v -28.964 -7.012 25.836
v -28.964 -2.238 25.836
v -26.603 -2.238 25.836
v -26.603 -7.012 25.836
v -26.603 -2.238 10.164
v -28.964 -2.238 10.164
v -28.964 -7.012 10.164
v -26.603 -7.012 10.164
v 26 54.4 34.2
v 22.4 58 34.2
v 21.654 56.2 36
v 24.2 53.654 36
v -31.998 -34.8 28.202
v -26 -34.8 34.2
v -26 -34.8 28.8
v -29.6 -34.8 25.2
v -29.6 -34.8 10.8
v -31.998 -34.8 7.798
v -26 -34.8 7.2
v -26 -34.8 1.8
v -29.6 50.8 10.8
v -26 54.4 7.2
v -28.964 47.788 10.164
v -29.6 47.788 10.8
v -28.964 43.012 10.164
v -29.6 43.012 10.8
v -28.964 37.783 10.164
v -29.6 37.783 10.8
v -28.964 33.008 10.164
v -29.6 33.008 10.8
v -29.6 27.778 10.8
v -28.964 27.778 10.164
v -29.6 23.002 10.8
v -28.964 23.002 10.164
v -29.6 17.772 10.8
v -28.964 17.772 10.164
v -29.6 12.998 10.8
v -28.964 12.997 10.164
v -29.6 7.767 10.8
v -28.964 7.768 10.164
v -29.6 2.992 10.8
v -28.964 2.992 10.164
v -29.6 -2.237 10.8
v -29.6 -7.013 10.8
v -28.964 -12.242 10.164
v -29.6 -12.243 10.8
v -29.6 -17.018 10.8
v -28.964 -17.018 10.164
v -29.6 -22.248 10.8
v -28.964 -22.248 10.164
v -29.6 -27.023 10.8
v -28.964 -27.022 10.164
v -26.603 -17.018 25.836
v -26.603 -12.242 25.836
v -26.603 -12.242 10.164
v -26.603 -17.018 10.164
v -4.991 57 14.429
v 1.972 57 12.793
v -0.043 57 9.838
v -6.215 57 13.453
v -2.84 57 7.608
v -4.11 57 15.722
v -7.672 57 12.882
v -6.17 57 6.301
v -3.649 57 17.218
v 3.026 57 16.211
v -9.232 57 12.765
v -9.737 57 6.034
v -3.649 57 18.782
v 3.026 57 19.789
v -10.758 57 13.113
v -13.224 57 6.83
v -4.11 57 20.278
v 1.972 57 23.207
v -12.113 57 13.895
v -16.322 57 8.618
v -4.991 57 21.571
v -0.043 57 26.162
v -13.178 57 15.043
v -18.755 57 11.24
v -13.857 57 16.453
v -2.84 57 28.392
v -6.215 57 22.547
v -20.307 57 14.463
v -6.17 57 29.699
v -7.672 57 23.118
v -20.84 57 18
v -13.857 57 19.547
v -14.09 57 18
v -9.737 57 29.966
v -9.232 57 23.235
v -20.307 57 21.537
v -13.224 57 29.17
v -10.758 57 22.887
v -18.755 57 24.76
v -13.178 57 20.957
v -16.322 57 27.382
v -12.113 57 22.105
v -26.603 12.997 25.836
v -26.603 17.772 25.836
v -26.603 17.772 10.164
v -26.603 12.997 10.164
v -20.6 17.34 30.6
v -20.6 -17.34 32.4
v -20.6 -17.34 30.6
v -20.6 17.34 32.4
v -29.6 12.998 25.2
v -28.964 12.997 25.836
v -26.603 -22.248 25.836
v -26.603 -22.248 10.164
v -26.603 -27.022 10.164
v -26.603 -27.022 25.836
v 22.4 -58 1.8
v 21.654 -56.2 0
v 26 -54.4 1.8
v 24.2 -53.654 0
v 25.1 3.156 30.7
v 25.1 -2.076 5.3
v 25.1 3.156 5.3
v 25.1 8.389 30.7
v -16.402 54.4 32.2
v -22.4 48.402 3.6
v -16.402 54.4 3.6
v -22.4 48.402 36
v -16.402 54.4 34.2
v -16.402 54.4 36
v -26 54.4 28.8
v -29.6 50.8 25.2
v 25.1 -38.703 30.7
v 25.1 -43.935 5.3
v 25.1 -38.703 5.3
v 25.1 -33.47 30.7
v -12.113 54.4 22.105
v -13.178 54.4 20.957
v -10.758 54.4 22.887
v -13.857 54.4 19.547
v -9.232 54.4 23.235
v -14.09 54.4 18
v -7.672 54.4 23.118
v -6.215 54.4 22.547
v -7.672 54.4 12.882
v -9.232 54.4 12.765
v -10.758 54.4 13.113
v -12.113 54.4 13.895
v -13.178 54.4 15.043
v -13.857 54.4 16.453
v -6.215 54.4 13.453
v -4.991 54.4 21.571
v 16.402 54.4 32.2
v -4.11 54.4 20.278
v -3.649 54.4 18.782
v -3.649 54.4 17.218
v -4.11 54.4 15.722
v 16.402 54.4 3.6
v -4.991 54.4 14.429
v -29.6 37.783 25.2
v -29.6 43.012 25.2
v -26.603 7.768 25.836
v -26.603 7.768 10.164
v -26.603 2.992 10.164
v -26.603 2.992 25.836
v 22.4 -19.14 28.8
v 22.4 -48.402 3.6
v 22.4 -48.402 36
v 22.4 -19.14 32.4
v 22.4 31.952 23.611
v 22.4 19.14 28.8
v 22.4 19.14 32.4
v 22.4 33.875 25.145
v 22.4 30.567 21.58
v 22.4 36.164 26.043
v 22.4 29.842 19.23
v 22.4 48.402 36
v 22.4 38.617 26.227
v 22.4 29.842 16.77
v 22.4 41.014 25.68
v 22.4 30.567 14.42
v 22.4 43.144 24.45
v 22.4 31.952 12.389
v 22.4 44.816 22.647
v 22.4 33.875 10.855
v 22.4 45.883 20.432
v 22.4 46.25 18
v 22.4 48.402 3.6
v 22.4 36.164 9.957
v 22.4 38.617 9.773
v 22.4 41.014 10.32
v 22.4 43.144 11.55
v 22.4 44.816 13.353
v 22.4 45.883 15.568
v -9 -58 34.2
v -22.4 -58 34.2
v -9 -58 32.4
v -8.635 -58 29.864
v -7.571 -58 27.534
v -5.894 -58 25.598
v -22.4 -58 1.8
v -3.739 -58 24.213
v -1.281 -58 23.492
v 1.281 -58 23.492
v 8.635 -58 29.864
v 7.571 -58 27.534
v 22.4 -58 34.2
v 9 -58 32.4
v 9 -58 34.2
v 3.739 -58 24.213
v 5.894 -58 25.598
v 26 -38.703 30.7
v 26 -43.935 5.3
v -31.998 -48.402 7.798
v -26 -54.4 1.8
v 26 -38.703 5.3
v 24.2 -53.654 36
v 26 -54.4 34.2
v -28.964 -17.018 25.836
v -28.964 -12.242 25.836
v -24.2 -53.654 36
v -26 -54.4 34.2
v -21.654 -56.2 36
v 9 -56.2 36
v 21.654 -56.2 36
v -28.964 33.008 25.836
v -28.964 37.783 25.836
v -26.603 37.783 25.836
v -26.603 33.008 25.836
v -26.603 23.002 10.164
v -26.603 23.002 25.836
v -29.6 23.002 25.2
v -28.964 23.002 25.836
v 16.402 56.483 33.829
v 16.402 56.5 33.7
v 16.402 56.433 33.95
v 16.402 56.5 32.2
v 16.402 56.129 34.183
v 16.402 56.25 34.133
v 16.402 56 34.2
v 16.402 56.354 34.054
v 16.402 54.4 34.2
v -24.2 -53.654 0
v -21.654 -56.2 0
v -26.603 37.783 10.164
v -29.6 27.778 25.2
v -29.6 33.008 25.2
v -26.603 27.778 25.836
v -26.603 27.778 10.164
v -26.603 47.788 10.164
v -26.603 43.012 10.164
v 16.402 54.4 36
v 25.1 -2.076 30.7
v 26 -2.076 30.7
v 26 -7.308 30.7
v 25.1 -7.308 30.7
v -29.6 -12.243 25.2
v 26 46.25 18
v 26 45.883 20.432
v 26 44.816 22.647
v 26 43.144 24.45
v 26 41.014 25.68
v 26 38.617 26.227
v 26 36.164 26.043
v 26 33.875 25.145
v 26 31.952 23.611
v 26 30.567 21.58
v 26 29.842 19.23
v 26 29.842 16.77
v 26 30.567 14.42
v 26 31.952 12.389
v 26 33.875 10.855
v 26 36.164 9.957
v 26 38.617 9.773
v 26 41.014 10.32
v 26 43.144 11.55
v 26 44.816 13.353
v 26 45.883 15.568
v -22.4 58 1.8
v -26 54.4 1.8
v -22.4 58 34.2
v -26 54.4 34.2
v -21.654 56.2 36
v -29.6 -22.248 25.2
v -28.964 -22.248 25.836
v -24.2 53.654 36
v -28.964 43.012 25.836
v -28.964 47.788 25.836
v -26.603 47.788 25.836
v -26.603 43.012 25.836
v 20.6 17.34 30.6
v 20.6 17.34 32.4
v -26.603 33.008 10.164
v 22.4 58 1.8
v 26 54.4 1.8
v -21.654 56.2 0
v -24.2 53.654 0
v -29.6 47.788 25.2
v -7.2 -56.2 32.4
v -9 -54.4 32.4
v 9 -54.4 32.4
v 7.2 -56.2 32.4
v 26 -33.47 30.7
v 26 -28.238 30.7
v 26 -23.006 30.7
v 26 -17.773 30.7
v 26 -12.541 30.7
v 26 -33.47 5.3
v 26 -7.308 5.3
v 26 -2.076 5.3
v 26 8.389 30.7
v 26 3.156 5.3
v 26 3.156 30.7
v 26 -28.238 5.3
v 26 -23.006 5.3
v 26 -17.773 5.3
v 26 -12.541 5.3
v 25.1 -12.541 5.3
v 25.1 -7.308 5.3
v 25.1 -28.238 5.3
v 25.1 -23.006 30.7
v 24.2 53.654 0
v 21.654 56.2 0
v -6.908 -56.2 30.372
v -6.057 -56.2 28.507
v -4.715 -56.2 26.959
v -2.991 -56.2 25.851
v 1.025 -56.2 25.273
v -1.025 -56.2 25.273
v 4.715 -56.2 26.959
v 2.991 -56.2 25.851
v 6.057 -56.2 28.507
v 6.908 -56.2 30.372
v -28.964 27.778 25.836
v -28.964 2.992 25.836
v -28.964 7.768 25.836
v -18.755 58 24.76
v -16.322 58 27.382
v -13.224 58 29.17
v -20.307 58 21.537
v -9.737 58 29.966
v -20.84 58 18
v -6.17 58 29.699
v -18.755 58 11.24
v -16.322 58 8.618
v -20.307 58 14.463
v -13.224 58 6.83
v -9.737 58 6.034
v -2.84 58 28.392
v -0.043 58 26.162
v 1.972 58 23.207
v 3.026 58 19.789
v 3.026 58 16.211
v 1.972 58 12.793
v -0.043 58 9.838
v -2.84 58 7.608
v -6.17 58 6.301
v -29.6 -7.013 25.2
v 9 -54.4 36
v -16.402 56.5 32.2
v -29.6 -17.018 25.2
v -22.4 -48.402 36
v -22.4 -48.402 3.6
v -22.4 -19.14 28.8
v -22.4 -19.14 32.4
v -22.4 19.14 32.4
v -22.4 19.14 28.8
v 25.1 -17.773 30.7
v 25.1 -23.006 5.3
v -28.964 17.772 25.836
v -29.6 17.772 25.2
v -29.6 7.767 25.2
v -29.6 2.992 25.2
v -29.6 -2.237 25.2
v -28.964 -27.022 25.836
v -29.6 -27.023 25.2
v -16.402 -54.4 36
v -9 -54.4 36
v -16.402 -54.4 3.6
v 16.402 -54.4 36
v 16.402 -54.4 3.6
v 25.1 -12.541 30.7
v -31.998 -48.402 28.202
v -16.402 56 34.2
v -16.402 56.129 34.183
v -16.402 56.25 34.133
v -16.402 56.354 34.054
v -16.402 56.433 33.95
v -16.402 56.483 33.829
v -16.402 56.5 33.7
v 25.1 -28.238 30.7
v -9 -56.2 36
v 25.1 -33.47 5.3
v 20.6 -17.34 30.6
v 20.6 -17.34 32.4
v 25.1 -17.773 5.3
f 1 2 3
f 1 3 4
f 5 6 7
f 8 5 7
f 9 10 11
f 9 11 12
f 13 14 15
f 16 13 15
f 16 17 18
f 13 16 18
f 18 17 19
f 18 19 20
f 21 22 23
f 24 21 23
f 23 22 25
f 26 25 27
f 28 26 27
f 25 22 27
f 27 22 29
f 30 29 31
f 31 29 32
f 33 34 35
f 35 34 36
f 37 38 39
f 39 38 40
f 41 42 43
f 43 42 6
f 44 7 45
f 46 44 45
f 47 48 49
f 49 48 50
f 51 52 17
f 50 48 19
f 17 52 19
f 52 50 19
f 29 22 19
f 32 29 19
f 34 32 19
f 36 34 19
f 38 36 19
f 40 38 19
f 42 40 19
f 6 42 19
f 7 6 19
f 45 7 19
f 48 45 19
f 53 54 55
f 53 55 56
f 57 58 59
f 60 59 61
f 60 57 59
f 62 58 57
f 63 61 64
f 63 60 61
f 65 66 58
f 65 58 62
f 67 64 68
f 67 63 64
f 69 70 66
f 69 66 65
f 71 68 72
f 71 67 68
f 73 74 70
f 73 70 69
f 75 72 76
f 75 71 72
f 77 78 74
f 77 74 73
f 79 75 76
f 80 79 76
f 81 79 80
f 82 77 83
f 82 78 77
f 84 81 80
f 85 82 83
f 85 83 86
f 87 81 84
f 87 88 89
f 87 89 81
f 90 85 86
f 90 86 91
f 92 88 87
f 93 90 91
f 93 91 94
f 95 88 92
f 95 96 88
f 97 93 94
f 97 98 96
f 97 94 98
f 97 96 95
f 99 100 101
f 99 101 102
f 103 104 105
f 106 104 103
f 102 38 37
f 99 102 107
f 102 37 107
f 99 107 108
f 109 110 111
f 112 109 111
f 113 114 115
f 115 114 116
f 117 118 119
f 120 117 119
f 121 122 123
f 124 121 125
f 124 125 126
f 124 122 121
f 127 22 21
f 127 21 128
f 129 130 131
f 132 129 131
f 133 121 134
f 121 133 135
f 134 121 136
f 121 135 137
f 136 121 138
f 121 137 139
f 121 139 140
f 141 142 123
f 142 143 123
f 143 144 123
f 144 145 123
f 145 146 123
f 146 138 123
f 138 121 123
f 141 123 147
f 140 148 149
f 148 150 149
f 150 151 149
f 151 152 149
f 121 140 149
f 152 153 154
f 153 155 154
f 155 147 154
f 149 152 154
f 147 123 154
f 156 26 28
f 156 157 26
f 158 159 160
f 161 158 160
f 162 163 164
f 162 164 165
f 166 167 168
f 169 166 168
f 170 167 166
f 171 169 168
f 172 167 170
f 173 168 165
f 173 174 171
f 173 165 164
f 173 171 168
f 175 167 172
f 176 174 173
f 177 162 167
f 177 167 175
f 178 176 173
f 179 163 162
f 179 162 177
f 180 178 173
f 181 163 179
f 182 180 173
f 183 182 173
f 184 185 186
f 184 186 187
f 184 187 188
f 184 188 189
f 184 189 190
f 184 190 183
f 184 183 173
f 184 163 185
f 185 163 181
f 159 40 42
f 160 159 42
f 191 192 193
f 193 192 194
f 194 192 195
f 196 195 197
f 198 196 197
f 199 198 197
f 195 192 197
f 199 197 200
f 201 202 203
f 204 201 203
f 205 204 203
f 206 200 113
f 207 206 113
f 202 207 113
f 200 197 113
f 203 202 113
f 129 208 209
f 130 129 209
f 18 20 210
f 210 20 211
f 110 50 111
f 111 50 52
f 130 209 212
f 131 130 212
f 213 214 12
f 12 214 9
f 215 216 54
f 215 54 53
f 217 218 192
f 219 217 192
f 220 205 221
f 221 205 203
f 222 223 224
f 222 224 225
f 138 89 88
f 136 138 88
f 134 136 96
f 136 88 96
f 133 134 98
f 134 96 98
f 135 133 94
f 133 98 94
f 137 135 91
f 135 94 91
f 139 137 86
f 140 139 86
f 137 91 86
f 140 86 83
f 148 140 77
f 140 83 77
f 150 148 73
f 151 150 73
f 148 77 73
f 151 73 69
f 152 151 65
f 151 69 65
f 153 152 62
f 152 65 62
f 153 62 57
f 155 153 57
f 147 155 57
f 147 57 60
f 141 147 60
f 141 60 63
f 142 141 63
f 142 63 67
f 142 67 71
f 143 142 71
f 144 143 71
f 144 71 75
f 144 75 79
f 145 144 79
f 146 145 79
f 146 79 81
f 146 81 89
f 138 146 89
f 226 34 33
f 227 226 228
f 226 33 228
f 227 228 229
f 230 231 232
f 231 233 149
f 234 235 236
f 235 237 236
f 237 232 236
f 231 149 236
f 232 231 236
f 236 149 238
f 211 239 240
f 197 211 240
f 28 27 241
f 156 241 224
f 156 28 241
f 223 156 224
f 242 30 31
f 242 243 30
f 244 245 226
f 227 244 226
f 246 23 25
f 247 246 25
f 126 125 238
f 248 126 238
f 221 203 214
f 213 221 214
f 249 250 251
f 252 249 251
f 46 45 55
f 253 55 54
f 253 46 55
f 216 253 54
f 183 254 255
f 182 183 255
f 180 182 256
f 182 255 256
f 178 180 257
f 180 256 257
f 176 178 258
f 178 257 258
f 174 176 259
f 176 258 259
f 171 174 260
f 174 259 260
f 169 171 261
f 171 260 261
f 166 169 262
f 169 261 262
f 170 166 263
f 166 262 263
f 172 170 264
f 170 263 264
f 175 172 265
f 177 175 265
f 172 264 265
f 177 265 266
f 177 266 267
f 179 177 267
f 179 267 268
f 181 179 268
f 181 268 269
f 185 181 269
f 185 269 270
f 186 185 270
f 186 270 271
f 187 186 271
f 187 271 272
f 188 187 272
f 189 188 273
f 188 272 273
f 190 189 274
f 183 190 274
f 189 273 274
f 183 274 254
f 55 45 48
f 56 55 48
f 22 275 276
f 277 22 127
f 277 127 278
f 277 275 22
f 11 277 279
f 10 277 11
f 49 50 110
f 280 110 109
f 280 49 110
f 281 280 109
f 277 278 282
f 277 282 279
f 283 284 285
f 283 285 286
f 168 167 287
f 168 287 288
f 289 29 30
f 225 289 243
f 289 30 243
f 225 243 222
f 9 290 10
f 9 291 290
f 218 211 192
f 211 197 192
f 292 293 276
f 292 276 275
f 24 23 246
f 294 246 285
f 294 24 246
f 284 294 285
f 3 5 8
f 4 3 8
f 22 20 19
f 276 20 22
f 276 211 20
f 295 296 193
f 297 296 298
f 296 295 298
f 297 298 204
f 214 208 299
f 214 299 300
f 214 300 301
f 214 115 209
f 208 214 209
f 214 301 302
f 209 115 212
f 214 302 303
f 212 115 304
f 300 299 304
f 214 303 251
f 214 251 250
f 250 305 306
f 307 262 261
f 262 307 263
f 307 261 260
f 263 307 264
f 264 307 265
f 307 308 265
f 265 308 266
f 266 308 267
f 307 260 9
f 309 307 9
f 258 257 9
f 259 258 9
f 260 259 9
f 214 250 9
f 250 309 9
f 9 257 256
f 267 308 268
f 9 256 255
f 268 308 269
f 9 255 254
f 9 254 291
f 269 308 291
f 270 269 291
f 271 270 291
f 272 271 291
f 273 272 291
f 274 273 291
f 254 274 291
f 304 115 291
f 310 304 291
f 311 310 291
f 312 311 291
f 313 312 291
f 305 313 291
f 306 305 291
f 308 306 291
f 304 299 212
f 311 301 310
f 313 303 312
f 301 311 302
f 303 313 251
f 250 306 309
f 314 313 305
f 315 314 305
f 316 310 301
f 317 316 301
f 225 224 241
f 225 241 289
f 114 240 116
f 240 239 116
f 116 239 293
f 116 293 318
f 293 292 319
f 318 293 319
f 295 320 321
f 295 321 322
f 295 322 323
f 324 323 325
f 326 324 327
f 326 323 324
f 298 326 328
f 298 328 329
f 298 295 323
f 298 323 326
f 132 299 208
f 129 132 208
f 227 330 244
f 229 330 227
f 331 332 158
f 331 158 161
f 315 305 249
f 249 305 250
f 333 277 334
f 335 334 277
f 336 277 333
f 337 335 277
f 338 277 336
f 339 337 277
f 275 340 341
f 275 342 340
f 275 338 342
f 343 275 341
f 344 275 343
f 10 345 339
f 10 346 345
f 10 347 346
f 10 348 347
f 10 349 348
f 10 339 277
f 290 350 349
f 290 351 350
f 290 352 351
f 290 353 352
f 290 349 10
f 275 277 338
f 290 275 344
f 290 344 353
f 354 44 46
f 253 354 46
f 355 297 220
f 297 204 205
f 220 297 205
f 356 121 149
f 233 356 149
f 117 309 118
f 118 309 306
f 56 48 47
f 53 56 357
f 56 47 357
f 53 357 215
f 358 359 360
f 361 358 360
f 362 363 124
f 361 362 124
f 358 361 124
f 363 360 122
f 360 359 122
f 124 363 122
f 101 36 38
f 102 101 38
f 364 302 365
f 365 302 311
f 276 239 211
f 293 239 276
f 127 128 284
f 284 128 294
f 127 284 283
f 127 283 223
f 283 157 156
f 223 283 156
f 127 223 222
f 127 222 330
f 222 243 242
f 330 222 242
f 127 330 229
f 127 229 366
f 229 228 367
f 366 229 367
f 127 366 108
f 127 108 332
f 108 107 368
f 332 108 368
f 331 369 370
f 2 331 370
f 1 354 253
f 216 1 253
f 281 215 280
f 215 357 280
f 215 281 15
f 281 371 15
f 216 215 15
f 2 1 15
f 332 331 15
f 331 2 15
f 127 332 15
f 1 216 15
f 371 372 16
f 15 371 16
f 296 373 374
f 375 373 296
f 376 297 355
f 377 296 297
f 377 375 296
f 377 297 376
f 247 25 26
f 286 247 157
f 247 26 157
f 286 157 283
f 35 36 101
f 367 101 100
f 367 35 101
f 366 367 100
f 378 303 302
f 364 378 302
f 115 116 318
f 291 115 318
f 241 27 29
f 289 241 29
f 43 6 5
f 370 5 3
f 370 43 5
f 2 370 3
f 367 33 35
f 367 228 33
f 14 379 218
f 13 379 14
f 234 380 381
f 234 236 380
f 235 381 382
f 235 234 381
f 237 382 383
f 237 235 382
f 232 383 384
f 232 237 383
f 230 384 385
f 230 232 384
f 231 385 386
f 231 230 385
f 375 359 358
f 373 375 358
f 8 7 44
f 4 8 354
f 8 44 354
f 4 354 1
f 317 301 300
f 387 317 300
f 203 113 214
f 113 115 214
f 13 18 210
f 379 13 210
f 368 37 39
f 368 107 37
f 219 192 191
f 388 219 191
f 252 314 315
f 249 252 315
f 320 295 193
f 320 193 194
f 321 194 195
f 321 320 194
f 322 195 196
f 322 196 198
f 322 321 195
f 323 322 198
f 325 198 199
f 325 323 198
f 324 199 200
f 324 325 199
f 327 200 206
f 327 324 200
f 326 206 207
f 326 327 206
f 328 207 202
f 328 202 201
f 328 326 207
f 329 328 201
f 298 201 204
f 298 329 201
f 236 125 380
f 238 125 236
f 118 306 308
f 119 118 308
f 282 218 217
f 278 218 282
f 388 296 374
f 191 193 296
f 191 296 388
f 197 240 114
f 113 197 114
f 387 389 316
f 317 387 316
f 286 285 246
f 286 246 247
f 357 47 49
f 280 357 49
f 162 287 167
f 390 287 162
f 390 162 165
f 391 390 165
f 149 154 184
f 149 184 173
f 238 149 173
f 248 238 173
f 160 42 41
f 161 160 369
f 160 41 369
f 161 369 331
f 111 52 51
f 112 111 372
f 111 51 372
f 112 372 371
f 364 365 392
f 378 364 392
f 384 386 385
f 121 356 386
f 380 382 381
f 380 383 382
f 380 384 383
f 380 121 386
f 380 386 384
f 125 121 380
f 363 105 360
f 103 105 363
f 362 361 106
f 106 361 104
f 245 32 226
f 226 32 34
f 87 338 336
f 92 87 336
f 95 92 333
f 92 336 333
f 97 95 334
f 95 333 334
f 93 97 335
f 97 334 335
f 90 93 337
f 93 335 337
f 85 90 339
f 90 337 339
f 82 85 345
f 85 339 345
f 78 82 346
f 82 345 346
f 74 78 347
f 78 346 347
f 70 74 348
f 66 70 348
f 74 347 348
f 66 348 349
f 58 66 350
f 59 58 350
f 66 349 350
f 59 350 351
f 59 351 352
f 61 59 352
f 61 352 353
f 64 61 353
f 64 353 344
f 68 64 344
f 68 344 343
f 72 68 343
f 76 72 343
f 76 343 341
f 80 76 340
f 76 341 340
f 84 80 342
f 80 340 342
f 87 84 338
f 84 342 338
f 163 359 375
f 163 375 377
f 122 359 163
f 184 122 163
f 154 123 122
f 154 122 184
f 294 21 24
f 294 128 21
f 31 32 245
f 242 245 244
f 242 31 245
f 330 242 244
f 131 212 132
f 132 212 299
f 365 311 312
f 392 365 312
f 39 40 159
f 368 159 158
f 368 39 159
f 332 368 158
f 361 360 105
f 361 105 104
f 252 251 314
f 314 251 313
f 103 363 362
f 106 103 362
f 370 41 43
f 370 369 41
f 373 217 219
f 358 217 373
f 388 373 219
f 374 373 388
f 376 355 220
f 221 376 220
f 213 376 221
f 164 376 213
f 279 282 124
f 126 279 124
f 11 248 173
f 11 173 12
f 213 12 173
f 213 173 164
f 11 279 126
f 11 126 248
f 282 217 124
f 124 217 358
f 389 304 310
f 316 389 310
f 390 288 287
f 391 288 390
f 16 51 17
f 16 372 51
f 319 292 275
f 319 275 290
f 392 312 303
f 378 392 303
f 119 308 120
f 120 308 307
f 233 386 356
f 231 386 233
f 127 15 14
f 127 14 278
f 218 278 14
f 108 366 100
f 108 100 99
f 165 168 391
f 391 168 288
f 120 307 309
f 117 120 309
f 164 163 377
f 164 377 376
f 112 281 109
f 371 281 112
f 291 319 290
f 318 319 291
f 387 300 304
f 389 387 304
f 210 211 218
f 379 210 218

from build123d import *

# Parameters (mm, degrees)
F2_W      = 52
F2_H      = 116
F2_W_2    = 44.8
F2_H_2    = 108.8
F3_DEPTH  = 36
F4_DEPTH  = 3.6
F7_SIZE   = 3.6
F8_SIZE   = 5.9976
F6_R      = 5.25
F9_DEPTH  = 3.6
F5_R      = 8.25
F10_DEPTH = 3.6
F11_W     = 18
F11_H     = 3.6
F12_DEPTH = 3.6
F13_W     = 32.8048
F13_H     = 2
F14_DEPTH = 2.1
F6_R_2    = 12
F15_DEPTH = 1
F16_R     = 0.5
F17_W     = 38.28
F17_H     = 3.6
F19_DEPTH = 1.8
F18_W     = 38.28
F18_H     = 3.6
F20_DEPTH = 1.8
F21_SIZE  = 1.79999
F23_DEPTH = 1.8
F24_SIZE  = 1.79999
F26_W     = 89.2
F26_H     = 21.6
F27_DEPTH = 3.6
F28_DEPTH = 5.9976
F30_SIZE  = 3.59999
F29_W     = 4.775
F29_H     = 15.6718
F31_DEPTH = 2.9972
F32_SIZE  = 5.99759
F34_DEPTH = 0.9


# Not quite as in the source:
# - two fillets or chamfers of one size are made in one step
# - a fillet or chamfer is up to 0.001 mm smaller than in the source, because OpenCascade refuses the exact size


with BuildPart() as f3:
    # F2 (on Top) → F3 (new body)
    with BuildSketch(Plane.XY):
        Rectangle(F2_W, F2_H)
        Rectangle(F2_W_2, F2_H_2, mode=Mode.SUBTRACT)
    extrude(amount=F3_DEPTH)

    # F2 (on Top) → F4 (join)
    with BuildSketch(Plane.XY):
        Rectangle(F2_W_2, F2_H_2)
    extrude(amount=F4_DEPTH)

    # F7
    f7_edges = [f3.edges().sort_by_distance(p)[0] for p in [
        (-26, -58, 18),
        (26, -58, 18),
        (26, 58, 18),
        (-26, 58, 18),
    ]]
    chamfer(f7_edges, length=F7_SIZE)

    # F8
    f8_edges = [f3.edges().sort_by_distance(p)[0] for p in [
        (-22.4, 54.4, 19.8),
        (22.4, 54.4, 19.8),
        (-22.4, -54.4, 19.8),
        (22.4, -54.4, 19.8),
    ]]
    chamfer(f8_edges, length=F8_SIZE)

    # F6 (on face) → F9 (cut)
    with BuildSketch(Plane(origin=(0, 58, 0), x_dir=(-1, 0, 0), z_dir=(0, 1, 0))):
        with Locations((8.84, 18)):
            Circle(F6_R)
    extrude(amount=-F9_DEPTH, mode=Mode.SUBTRACT)

    # F5 (on face) → F10 (cut)
    with BuildSketch(Plane.YZ.offset(26)):
        with Locations((38, 18)):
            Circle(F5_R)
    extrude(amount=-F10_DEPTH, mode=Mode.SUBTRACT)

    # F11 (on face) → F12 (cut)
    with BuildSketch(Plane.XZ.offset(58)):
        with Locations((0, 34.2)):
            Rectangle(F11_W, F11_H)
    extrude(amount=-F12_DEPTH, mode=Mode.SUBTRACT)

    # F13 (on face) → F14 (cut)
    with BuildSketch(Plane.XZ.offset(-54.4)):
        with Locations((0, 33.2)):
            Rectangle(F13_W, F13_H)
    extrude(amount=-F14_DEPTH, mode=Mode.SUBTRACT)

    # F6 (on face) → F15 (cut)
    with BuildSketch(Plane(origin=(0, 58, 0), x_dir=(-1, 0, 0), z_dir=(0, 1, 0))):
        with Locations((8.84, 18)):
            Circle(F6_R_2)
        with Locations((8.84, 18)):
            Circle(F6_R, mode=Mode.SUBTRACT)
    extrude(amount=-F15_DEPTH, mode=Mode.SUBTRACT)

    # F16
    f16_edges = [f3.edges().sort_by_distance(p)[0] for p in [
        (0, 56.5, 34.2),
    ]]
    fillet(f16_edges, radius=F16_R)

    # F17 (on face) → F19 (join)
    with BuildSketch(Plane(origin=(22.4, 0, 0), x_dir=(0, -1, 0), z_dir=(-1, 0, 0))):
        with Locations((0, 30.6)):
            Rectangle(F17_W, F17_H)
    extrude(amount=F19_DEPTH)

    # F18 (on face) → F20 (join)
    with BuildSketch(Plane.YZ.offset(-22.4)):
        with Locations((0, 30.6)):
            Rectangle(F18_W, F18_H)
    extrude(amount=F20_DEPTH)

    # F21 (size 1.8 in the source; OpenCascade refuses exactly that, so slightly less here)
    f21_edges = [f3.edges().sort_by_distance(p)[0] for p in [
        (-20.6, -19.14, 30.6),
        (-20.6, 0, 28.8),
        (-20.6, 19.14, 30.6),
        (20.6, 19.14, 30.6),
        (20.6, 0, 28.8),
        (20.6, -19.14, 30.6),
        (-15.7, -58, 36),
        (-24.2, -56.2, 36),
        (-26, 0, 36),
        (-24.2, 56.2, 36),
        (0, 58, 36),
        (24.2, 56.2, 36),
        (26, 0, 36),
        (24.2, -56.2, 36),
        (15.7, -58, 36),
        (0, -58, 0),
        (-24.2, -56.2, 0),
        (-26, 0, 0),
        (-24.2, 56.2, 0),
        (0, 58, 0),
        (24.2, 56.2, 0),
        (26, 0, 0),
        (24.2, -56.2, 0),
    ]]
    chamfer(f21_edges, length=F21_SIZE)

    # F11 (on face) → F23 (cut)
    with BuildSketch(Plane.XZ.offset(58)):
        with BuildLine():
            ThreePointArc((-9, 32.4), (0, 23.4), (9, 32.4))
            Line((9, 32.4), (-9, 32.4))
        make_face()
    extrude(amount=-F23_DEPTH, mode=Mode.SUBTRACT)

    # F24 (size 1.8 in the source; OpenCascade refuses exactly that, so slightly less here)
    f24_edges = [f3.edges().sort_by_distance(p)[0] for p in [
        (0, -56.2, 23.4),
    ]]
    chamfer(f24_edges, length=F24_SIZE)

    # F26 (on face) → F27 (join)
    with BuildSketch(Plane(origin=(-26, 0, 0), x_dir=(0, -1, 0), z_dir=(-1, 0, 0))):
        with Locations((-9.8, 18)):
            Rectangle(F26_W, F26_H)
    extrude(amount=F27_DEPTH)

    # F26 (on face) → F28 (join)
    with BuildSketch(Plane(origin=(-26, 0, 0), x_dir=(0, -1, 0), z_dir=(-1, 0, 0))):
        Polygon((54.4, 1.8), (54.4, 34.2), (34.8, 34.2), (34.8, 28.8), (34.8, 7.2), (34.8, 1.8), align=None)
    extrude(amount=F28_DEPTH)

    # F30 (size 3.6 in the source; OpenCascade refuses exactly that, so slightly less here)
    f30_edges = [f3.edges().sort_by_distance(p)[0] for p in [
        (-29.6, 54.4, 18),
        (-29.6, 9.8, 7.2),
        (-29.6, 9.8, 28.8),
    ]]
    chamfer(f30_edges, length=F30_SIZE)

    # F29 (on face) → F31 (cut)
    with BuildSketch(Plane(origin=(-29.6, 0, 0), x_dir=(0, -1, 0), z_dir=(-1, 0, 0))):
        with Locations((-45.4, 18)):
            Rectangle(F29_W, F29_H)
        with Locations((-35.395, 18)):
            Rectangle(F29_W, F29_H)
        with Locations((-25.39, 18)):
            Rectangle(F29_W, F29_H)
        with Locations((-15.385, 18)):
            Rectangle(F29_W, F29_H)
        with Locations((-5.38, 18)):
            Rectangle(F29_W, F29_H)
        with Locations((4.625, 18)):
            Rectangle(F29_W, F29_H)
        with Locations((14.63, 18)):
            Rectangle(F29_W, F29_H)
        with Locations((24.635, 18)):
            Rectangle(F29_W, F29_H)
    extrude(amount=-F31_DEPTH, mode=Mode.SUBTRACT)

    # F32 (size 5.9976 in the source; OpenCascade refuses exactly that, so slightly less here)
    f32_edges = [f3.edges().sort_by_distance(p)[0] for p in [
        (-31.9976, -44.6, 34.2),
        (-31.9976, -54.4, 18),
        (-31.9976, -44.6, 1.8),
    ]]
    chamfer(f32_edges, length=F32_SIZE)

    # F33 (on face) → F34 (cut)
    with BuildSketch(Plane.YZ.offset(26)):
        Polygon((-33.4704, 30.7), (-38.7028, 30.7), (-43.9352, 5.3), (-38.7028, 5.3), align=None)
        Polygon((-23.0056, 30.7), (-28.238, 30.7), (-33.4704, 5.3), (-28.238, 5.3), align=None)
        Polygon((-12.5408, 30.7), (-17.7732, 30.7), (-23.0056, 5.3), (-17.7732, 5.3), align=None)
        Polygon((-2.076, 30.7), (-7.3084, 30.7), (-12.5408, 5.3), (-7.3084, 5.3), align=None)
        Polygon((8.3888, 30.7), (3.1564, 30.7), (-2.076, 5.3), (3.1564, 5.3), align=None)
    extrude(amount=-F34_DEPTH, mode=Mode.SUBTRACT)


solid = f3.part
